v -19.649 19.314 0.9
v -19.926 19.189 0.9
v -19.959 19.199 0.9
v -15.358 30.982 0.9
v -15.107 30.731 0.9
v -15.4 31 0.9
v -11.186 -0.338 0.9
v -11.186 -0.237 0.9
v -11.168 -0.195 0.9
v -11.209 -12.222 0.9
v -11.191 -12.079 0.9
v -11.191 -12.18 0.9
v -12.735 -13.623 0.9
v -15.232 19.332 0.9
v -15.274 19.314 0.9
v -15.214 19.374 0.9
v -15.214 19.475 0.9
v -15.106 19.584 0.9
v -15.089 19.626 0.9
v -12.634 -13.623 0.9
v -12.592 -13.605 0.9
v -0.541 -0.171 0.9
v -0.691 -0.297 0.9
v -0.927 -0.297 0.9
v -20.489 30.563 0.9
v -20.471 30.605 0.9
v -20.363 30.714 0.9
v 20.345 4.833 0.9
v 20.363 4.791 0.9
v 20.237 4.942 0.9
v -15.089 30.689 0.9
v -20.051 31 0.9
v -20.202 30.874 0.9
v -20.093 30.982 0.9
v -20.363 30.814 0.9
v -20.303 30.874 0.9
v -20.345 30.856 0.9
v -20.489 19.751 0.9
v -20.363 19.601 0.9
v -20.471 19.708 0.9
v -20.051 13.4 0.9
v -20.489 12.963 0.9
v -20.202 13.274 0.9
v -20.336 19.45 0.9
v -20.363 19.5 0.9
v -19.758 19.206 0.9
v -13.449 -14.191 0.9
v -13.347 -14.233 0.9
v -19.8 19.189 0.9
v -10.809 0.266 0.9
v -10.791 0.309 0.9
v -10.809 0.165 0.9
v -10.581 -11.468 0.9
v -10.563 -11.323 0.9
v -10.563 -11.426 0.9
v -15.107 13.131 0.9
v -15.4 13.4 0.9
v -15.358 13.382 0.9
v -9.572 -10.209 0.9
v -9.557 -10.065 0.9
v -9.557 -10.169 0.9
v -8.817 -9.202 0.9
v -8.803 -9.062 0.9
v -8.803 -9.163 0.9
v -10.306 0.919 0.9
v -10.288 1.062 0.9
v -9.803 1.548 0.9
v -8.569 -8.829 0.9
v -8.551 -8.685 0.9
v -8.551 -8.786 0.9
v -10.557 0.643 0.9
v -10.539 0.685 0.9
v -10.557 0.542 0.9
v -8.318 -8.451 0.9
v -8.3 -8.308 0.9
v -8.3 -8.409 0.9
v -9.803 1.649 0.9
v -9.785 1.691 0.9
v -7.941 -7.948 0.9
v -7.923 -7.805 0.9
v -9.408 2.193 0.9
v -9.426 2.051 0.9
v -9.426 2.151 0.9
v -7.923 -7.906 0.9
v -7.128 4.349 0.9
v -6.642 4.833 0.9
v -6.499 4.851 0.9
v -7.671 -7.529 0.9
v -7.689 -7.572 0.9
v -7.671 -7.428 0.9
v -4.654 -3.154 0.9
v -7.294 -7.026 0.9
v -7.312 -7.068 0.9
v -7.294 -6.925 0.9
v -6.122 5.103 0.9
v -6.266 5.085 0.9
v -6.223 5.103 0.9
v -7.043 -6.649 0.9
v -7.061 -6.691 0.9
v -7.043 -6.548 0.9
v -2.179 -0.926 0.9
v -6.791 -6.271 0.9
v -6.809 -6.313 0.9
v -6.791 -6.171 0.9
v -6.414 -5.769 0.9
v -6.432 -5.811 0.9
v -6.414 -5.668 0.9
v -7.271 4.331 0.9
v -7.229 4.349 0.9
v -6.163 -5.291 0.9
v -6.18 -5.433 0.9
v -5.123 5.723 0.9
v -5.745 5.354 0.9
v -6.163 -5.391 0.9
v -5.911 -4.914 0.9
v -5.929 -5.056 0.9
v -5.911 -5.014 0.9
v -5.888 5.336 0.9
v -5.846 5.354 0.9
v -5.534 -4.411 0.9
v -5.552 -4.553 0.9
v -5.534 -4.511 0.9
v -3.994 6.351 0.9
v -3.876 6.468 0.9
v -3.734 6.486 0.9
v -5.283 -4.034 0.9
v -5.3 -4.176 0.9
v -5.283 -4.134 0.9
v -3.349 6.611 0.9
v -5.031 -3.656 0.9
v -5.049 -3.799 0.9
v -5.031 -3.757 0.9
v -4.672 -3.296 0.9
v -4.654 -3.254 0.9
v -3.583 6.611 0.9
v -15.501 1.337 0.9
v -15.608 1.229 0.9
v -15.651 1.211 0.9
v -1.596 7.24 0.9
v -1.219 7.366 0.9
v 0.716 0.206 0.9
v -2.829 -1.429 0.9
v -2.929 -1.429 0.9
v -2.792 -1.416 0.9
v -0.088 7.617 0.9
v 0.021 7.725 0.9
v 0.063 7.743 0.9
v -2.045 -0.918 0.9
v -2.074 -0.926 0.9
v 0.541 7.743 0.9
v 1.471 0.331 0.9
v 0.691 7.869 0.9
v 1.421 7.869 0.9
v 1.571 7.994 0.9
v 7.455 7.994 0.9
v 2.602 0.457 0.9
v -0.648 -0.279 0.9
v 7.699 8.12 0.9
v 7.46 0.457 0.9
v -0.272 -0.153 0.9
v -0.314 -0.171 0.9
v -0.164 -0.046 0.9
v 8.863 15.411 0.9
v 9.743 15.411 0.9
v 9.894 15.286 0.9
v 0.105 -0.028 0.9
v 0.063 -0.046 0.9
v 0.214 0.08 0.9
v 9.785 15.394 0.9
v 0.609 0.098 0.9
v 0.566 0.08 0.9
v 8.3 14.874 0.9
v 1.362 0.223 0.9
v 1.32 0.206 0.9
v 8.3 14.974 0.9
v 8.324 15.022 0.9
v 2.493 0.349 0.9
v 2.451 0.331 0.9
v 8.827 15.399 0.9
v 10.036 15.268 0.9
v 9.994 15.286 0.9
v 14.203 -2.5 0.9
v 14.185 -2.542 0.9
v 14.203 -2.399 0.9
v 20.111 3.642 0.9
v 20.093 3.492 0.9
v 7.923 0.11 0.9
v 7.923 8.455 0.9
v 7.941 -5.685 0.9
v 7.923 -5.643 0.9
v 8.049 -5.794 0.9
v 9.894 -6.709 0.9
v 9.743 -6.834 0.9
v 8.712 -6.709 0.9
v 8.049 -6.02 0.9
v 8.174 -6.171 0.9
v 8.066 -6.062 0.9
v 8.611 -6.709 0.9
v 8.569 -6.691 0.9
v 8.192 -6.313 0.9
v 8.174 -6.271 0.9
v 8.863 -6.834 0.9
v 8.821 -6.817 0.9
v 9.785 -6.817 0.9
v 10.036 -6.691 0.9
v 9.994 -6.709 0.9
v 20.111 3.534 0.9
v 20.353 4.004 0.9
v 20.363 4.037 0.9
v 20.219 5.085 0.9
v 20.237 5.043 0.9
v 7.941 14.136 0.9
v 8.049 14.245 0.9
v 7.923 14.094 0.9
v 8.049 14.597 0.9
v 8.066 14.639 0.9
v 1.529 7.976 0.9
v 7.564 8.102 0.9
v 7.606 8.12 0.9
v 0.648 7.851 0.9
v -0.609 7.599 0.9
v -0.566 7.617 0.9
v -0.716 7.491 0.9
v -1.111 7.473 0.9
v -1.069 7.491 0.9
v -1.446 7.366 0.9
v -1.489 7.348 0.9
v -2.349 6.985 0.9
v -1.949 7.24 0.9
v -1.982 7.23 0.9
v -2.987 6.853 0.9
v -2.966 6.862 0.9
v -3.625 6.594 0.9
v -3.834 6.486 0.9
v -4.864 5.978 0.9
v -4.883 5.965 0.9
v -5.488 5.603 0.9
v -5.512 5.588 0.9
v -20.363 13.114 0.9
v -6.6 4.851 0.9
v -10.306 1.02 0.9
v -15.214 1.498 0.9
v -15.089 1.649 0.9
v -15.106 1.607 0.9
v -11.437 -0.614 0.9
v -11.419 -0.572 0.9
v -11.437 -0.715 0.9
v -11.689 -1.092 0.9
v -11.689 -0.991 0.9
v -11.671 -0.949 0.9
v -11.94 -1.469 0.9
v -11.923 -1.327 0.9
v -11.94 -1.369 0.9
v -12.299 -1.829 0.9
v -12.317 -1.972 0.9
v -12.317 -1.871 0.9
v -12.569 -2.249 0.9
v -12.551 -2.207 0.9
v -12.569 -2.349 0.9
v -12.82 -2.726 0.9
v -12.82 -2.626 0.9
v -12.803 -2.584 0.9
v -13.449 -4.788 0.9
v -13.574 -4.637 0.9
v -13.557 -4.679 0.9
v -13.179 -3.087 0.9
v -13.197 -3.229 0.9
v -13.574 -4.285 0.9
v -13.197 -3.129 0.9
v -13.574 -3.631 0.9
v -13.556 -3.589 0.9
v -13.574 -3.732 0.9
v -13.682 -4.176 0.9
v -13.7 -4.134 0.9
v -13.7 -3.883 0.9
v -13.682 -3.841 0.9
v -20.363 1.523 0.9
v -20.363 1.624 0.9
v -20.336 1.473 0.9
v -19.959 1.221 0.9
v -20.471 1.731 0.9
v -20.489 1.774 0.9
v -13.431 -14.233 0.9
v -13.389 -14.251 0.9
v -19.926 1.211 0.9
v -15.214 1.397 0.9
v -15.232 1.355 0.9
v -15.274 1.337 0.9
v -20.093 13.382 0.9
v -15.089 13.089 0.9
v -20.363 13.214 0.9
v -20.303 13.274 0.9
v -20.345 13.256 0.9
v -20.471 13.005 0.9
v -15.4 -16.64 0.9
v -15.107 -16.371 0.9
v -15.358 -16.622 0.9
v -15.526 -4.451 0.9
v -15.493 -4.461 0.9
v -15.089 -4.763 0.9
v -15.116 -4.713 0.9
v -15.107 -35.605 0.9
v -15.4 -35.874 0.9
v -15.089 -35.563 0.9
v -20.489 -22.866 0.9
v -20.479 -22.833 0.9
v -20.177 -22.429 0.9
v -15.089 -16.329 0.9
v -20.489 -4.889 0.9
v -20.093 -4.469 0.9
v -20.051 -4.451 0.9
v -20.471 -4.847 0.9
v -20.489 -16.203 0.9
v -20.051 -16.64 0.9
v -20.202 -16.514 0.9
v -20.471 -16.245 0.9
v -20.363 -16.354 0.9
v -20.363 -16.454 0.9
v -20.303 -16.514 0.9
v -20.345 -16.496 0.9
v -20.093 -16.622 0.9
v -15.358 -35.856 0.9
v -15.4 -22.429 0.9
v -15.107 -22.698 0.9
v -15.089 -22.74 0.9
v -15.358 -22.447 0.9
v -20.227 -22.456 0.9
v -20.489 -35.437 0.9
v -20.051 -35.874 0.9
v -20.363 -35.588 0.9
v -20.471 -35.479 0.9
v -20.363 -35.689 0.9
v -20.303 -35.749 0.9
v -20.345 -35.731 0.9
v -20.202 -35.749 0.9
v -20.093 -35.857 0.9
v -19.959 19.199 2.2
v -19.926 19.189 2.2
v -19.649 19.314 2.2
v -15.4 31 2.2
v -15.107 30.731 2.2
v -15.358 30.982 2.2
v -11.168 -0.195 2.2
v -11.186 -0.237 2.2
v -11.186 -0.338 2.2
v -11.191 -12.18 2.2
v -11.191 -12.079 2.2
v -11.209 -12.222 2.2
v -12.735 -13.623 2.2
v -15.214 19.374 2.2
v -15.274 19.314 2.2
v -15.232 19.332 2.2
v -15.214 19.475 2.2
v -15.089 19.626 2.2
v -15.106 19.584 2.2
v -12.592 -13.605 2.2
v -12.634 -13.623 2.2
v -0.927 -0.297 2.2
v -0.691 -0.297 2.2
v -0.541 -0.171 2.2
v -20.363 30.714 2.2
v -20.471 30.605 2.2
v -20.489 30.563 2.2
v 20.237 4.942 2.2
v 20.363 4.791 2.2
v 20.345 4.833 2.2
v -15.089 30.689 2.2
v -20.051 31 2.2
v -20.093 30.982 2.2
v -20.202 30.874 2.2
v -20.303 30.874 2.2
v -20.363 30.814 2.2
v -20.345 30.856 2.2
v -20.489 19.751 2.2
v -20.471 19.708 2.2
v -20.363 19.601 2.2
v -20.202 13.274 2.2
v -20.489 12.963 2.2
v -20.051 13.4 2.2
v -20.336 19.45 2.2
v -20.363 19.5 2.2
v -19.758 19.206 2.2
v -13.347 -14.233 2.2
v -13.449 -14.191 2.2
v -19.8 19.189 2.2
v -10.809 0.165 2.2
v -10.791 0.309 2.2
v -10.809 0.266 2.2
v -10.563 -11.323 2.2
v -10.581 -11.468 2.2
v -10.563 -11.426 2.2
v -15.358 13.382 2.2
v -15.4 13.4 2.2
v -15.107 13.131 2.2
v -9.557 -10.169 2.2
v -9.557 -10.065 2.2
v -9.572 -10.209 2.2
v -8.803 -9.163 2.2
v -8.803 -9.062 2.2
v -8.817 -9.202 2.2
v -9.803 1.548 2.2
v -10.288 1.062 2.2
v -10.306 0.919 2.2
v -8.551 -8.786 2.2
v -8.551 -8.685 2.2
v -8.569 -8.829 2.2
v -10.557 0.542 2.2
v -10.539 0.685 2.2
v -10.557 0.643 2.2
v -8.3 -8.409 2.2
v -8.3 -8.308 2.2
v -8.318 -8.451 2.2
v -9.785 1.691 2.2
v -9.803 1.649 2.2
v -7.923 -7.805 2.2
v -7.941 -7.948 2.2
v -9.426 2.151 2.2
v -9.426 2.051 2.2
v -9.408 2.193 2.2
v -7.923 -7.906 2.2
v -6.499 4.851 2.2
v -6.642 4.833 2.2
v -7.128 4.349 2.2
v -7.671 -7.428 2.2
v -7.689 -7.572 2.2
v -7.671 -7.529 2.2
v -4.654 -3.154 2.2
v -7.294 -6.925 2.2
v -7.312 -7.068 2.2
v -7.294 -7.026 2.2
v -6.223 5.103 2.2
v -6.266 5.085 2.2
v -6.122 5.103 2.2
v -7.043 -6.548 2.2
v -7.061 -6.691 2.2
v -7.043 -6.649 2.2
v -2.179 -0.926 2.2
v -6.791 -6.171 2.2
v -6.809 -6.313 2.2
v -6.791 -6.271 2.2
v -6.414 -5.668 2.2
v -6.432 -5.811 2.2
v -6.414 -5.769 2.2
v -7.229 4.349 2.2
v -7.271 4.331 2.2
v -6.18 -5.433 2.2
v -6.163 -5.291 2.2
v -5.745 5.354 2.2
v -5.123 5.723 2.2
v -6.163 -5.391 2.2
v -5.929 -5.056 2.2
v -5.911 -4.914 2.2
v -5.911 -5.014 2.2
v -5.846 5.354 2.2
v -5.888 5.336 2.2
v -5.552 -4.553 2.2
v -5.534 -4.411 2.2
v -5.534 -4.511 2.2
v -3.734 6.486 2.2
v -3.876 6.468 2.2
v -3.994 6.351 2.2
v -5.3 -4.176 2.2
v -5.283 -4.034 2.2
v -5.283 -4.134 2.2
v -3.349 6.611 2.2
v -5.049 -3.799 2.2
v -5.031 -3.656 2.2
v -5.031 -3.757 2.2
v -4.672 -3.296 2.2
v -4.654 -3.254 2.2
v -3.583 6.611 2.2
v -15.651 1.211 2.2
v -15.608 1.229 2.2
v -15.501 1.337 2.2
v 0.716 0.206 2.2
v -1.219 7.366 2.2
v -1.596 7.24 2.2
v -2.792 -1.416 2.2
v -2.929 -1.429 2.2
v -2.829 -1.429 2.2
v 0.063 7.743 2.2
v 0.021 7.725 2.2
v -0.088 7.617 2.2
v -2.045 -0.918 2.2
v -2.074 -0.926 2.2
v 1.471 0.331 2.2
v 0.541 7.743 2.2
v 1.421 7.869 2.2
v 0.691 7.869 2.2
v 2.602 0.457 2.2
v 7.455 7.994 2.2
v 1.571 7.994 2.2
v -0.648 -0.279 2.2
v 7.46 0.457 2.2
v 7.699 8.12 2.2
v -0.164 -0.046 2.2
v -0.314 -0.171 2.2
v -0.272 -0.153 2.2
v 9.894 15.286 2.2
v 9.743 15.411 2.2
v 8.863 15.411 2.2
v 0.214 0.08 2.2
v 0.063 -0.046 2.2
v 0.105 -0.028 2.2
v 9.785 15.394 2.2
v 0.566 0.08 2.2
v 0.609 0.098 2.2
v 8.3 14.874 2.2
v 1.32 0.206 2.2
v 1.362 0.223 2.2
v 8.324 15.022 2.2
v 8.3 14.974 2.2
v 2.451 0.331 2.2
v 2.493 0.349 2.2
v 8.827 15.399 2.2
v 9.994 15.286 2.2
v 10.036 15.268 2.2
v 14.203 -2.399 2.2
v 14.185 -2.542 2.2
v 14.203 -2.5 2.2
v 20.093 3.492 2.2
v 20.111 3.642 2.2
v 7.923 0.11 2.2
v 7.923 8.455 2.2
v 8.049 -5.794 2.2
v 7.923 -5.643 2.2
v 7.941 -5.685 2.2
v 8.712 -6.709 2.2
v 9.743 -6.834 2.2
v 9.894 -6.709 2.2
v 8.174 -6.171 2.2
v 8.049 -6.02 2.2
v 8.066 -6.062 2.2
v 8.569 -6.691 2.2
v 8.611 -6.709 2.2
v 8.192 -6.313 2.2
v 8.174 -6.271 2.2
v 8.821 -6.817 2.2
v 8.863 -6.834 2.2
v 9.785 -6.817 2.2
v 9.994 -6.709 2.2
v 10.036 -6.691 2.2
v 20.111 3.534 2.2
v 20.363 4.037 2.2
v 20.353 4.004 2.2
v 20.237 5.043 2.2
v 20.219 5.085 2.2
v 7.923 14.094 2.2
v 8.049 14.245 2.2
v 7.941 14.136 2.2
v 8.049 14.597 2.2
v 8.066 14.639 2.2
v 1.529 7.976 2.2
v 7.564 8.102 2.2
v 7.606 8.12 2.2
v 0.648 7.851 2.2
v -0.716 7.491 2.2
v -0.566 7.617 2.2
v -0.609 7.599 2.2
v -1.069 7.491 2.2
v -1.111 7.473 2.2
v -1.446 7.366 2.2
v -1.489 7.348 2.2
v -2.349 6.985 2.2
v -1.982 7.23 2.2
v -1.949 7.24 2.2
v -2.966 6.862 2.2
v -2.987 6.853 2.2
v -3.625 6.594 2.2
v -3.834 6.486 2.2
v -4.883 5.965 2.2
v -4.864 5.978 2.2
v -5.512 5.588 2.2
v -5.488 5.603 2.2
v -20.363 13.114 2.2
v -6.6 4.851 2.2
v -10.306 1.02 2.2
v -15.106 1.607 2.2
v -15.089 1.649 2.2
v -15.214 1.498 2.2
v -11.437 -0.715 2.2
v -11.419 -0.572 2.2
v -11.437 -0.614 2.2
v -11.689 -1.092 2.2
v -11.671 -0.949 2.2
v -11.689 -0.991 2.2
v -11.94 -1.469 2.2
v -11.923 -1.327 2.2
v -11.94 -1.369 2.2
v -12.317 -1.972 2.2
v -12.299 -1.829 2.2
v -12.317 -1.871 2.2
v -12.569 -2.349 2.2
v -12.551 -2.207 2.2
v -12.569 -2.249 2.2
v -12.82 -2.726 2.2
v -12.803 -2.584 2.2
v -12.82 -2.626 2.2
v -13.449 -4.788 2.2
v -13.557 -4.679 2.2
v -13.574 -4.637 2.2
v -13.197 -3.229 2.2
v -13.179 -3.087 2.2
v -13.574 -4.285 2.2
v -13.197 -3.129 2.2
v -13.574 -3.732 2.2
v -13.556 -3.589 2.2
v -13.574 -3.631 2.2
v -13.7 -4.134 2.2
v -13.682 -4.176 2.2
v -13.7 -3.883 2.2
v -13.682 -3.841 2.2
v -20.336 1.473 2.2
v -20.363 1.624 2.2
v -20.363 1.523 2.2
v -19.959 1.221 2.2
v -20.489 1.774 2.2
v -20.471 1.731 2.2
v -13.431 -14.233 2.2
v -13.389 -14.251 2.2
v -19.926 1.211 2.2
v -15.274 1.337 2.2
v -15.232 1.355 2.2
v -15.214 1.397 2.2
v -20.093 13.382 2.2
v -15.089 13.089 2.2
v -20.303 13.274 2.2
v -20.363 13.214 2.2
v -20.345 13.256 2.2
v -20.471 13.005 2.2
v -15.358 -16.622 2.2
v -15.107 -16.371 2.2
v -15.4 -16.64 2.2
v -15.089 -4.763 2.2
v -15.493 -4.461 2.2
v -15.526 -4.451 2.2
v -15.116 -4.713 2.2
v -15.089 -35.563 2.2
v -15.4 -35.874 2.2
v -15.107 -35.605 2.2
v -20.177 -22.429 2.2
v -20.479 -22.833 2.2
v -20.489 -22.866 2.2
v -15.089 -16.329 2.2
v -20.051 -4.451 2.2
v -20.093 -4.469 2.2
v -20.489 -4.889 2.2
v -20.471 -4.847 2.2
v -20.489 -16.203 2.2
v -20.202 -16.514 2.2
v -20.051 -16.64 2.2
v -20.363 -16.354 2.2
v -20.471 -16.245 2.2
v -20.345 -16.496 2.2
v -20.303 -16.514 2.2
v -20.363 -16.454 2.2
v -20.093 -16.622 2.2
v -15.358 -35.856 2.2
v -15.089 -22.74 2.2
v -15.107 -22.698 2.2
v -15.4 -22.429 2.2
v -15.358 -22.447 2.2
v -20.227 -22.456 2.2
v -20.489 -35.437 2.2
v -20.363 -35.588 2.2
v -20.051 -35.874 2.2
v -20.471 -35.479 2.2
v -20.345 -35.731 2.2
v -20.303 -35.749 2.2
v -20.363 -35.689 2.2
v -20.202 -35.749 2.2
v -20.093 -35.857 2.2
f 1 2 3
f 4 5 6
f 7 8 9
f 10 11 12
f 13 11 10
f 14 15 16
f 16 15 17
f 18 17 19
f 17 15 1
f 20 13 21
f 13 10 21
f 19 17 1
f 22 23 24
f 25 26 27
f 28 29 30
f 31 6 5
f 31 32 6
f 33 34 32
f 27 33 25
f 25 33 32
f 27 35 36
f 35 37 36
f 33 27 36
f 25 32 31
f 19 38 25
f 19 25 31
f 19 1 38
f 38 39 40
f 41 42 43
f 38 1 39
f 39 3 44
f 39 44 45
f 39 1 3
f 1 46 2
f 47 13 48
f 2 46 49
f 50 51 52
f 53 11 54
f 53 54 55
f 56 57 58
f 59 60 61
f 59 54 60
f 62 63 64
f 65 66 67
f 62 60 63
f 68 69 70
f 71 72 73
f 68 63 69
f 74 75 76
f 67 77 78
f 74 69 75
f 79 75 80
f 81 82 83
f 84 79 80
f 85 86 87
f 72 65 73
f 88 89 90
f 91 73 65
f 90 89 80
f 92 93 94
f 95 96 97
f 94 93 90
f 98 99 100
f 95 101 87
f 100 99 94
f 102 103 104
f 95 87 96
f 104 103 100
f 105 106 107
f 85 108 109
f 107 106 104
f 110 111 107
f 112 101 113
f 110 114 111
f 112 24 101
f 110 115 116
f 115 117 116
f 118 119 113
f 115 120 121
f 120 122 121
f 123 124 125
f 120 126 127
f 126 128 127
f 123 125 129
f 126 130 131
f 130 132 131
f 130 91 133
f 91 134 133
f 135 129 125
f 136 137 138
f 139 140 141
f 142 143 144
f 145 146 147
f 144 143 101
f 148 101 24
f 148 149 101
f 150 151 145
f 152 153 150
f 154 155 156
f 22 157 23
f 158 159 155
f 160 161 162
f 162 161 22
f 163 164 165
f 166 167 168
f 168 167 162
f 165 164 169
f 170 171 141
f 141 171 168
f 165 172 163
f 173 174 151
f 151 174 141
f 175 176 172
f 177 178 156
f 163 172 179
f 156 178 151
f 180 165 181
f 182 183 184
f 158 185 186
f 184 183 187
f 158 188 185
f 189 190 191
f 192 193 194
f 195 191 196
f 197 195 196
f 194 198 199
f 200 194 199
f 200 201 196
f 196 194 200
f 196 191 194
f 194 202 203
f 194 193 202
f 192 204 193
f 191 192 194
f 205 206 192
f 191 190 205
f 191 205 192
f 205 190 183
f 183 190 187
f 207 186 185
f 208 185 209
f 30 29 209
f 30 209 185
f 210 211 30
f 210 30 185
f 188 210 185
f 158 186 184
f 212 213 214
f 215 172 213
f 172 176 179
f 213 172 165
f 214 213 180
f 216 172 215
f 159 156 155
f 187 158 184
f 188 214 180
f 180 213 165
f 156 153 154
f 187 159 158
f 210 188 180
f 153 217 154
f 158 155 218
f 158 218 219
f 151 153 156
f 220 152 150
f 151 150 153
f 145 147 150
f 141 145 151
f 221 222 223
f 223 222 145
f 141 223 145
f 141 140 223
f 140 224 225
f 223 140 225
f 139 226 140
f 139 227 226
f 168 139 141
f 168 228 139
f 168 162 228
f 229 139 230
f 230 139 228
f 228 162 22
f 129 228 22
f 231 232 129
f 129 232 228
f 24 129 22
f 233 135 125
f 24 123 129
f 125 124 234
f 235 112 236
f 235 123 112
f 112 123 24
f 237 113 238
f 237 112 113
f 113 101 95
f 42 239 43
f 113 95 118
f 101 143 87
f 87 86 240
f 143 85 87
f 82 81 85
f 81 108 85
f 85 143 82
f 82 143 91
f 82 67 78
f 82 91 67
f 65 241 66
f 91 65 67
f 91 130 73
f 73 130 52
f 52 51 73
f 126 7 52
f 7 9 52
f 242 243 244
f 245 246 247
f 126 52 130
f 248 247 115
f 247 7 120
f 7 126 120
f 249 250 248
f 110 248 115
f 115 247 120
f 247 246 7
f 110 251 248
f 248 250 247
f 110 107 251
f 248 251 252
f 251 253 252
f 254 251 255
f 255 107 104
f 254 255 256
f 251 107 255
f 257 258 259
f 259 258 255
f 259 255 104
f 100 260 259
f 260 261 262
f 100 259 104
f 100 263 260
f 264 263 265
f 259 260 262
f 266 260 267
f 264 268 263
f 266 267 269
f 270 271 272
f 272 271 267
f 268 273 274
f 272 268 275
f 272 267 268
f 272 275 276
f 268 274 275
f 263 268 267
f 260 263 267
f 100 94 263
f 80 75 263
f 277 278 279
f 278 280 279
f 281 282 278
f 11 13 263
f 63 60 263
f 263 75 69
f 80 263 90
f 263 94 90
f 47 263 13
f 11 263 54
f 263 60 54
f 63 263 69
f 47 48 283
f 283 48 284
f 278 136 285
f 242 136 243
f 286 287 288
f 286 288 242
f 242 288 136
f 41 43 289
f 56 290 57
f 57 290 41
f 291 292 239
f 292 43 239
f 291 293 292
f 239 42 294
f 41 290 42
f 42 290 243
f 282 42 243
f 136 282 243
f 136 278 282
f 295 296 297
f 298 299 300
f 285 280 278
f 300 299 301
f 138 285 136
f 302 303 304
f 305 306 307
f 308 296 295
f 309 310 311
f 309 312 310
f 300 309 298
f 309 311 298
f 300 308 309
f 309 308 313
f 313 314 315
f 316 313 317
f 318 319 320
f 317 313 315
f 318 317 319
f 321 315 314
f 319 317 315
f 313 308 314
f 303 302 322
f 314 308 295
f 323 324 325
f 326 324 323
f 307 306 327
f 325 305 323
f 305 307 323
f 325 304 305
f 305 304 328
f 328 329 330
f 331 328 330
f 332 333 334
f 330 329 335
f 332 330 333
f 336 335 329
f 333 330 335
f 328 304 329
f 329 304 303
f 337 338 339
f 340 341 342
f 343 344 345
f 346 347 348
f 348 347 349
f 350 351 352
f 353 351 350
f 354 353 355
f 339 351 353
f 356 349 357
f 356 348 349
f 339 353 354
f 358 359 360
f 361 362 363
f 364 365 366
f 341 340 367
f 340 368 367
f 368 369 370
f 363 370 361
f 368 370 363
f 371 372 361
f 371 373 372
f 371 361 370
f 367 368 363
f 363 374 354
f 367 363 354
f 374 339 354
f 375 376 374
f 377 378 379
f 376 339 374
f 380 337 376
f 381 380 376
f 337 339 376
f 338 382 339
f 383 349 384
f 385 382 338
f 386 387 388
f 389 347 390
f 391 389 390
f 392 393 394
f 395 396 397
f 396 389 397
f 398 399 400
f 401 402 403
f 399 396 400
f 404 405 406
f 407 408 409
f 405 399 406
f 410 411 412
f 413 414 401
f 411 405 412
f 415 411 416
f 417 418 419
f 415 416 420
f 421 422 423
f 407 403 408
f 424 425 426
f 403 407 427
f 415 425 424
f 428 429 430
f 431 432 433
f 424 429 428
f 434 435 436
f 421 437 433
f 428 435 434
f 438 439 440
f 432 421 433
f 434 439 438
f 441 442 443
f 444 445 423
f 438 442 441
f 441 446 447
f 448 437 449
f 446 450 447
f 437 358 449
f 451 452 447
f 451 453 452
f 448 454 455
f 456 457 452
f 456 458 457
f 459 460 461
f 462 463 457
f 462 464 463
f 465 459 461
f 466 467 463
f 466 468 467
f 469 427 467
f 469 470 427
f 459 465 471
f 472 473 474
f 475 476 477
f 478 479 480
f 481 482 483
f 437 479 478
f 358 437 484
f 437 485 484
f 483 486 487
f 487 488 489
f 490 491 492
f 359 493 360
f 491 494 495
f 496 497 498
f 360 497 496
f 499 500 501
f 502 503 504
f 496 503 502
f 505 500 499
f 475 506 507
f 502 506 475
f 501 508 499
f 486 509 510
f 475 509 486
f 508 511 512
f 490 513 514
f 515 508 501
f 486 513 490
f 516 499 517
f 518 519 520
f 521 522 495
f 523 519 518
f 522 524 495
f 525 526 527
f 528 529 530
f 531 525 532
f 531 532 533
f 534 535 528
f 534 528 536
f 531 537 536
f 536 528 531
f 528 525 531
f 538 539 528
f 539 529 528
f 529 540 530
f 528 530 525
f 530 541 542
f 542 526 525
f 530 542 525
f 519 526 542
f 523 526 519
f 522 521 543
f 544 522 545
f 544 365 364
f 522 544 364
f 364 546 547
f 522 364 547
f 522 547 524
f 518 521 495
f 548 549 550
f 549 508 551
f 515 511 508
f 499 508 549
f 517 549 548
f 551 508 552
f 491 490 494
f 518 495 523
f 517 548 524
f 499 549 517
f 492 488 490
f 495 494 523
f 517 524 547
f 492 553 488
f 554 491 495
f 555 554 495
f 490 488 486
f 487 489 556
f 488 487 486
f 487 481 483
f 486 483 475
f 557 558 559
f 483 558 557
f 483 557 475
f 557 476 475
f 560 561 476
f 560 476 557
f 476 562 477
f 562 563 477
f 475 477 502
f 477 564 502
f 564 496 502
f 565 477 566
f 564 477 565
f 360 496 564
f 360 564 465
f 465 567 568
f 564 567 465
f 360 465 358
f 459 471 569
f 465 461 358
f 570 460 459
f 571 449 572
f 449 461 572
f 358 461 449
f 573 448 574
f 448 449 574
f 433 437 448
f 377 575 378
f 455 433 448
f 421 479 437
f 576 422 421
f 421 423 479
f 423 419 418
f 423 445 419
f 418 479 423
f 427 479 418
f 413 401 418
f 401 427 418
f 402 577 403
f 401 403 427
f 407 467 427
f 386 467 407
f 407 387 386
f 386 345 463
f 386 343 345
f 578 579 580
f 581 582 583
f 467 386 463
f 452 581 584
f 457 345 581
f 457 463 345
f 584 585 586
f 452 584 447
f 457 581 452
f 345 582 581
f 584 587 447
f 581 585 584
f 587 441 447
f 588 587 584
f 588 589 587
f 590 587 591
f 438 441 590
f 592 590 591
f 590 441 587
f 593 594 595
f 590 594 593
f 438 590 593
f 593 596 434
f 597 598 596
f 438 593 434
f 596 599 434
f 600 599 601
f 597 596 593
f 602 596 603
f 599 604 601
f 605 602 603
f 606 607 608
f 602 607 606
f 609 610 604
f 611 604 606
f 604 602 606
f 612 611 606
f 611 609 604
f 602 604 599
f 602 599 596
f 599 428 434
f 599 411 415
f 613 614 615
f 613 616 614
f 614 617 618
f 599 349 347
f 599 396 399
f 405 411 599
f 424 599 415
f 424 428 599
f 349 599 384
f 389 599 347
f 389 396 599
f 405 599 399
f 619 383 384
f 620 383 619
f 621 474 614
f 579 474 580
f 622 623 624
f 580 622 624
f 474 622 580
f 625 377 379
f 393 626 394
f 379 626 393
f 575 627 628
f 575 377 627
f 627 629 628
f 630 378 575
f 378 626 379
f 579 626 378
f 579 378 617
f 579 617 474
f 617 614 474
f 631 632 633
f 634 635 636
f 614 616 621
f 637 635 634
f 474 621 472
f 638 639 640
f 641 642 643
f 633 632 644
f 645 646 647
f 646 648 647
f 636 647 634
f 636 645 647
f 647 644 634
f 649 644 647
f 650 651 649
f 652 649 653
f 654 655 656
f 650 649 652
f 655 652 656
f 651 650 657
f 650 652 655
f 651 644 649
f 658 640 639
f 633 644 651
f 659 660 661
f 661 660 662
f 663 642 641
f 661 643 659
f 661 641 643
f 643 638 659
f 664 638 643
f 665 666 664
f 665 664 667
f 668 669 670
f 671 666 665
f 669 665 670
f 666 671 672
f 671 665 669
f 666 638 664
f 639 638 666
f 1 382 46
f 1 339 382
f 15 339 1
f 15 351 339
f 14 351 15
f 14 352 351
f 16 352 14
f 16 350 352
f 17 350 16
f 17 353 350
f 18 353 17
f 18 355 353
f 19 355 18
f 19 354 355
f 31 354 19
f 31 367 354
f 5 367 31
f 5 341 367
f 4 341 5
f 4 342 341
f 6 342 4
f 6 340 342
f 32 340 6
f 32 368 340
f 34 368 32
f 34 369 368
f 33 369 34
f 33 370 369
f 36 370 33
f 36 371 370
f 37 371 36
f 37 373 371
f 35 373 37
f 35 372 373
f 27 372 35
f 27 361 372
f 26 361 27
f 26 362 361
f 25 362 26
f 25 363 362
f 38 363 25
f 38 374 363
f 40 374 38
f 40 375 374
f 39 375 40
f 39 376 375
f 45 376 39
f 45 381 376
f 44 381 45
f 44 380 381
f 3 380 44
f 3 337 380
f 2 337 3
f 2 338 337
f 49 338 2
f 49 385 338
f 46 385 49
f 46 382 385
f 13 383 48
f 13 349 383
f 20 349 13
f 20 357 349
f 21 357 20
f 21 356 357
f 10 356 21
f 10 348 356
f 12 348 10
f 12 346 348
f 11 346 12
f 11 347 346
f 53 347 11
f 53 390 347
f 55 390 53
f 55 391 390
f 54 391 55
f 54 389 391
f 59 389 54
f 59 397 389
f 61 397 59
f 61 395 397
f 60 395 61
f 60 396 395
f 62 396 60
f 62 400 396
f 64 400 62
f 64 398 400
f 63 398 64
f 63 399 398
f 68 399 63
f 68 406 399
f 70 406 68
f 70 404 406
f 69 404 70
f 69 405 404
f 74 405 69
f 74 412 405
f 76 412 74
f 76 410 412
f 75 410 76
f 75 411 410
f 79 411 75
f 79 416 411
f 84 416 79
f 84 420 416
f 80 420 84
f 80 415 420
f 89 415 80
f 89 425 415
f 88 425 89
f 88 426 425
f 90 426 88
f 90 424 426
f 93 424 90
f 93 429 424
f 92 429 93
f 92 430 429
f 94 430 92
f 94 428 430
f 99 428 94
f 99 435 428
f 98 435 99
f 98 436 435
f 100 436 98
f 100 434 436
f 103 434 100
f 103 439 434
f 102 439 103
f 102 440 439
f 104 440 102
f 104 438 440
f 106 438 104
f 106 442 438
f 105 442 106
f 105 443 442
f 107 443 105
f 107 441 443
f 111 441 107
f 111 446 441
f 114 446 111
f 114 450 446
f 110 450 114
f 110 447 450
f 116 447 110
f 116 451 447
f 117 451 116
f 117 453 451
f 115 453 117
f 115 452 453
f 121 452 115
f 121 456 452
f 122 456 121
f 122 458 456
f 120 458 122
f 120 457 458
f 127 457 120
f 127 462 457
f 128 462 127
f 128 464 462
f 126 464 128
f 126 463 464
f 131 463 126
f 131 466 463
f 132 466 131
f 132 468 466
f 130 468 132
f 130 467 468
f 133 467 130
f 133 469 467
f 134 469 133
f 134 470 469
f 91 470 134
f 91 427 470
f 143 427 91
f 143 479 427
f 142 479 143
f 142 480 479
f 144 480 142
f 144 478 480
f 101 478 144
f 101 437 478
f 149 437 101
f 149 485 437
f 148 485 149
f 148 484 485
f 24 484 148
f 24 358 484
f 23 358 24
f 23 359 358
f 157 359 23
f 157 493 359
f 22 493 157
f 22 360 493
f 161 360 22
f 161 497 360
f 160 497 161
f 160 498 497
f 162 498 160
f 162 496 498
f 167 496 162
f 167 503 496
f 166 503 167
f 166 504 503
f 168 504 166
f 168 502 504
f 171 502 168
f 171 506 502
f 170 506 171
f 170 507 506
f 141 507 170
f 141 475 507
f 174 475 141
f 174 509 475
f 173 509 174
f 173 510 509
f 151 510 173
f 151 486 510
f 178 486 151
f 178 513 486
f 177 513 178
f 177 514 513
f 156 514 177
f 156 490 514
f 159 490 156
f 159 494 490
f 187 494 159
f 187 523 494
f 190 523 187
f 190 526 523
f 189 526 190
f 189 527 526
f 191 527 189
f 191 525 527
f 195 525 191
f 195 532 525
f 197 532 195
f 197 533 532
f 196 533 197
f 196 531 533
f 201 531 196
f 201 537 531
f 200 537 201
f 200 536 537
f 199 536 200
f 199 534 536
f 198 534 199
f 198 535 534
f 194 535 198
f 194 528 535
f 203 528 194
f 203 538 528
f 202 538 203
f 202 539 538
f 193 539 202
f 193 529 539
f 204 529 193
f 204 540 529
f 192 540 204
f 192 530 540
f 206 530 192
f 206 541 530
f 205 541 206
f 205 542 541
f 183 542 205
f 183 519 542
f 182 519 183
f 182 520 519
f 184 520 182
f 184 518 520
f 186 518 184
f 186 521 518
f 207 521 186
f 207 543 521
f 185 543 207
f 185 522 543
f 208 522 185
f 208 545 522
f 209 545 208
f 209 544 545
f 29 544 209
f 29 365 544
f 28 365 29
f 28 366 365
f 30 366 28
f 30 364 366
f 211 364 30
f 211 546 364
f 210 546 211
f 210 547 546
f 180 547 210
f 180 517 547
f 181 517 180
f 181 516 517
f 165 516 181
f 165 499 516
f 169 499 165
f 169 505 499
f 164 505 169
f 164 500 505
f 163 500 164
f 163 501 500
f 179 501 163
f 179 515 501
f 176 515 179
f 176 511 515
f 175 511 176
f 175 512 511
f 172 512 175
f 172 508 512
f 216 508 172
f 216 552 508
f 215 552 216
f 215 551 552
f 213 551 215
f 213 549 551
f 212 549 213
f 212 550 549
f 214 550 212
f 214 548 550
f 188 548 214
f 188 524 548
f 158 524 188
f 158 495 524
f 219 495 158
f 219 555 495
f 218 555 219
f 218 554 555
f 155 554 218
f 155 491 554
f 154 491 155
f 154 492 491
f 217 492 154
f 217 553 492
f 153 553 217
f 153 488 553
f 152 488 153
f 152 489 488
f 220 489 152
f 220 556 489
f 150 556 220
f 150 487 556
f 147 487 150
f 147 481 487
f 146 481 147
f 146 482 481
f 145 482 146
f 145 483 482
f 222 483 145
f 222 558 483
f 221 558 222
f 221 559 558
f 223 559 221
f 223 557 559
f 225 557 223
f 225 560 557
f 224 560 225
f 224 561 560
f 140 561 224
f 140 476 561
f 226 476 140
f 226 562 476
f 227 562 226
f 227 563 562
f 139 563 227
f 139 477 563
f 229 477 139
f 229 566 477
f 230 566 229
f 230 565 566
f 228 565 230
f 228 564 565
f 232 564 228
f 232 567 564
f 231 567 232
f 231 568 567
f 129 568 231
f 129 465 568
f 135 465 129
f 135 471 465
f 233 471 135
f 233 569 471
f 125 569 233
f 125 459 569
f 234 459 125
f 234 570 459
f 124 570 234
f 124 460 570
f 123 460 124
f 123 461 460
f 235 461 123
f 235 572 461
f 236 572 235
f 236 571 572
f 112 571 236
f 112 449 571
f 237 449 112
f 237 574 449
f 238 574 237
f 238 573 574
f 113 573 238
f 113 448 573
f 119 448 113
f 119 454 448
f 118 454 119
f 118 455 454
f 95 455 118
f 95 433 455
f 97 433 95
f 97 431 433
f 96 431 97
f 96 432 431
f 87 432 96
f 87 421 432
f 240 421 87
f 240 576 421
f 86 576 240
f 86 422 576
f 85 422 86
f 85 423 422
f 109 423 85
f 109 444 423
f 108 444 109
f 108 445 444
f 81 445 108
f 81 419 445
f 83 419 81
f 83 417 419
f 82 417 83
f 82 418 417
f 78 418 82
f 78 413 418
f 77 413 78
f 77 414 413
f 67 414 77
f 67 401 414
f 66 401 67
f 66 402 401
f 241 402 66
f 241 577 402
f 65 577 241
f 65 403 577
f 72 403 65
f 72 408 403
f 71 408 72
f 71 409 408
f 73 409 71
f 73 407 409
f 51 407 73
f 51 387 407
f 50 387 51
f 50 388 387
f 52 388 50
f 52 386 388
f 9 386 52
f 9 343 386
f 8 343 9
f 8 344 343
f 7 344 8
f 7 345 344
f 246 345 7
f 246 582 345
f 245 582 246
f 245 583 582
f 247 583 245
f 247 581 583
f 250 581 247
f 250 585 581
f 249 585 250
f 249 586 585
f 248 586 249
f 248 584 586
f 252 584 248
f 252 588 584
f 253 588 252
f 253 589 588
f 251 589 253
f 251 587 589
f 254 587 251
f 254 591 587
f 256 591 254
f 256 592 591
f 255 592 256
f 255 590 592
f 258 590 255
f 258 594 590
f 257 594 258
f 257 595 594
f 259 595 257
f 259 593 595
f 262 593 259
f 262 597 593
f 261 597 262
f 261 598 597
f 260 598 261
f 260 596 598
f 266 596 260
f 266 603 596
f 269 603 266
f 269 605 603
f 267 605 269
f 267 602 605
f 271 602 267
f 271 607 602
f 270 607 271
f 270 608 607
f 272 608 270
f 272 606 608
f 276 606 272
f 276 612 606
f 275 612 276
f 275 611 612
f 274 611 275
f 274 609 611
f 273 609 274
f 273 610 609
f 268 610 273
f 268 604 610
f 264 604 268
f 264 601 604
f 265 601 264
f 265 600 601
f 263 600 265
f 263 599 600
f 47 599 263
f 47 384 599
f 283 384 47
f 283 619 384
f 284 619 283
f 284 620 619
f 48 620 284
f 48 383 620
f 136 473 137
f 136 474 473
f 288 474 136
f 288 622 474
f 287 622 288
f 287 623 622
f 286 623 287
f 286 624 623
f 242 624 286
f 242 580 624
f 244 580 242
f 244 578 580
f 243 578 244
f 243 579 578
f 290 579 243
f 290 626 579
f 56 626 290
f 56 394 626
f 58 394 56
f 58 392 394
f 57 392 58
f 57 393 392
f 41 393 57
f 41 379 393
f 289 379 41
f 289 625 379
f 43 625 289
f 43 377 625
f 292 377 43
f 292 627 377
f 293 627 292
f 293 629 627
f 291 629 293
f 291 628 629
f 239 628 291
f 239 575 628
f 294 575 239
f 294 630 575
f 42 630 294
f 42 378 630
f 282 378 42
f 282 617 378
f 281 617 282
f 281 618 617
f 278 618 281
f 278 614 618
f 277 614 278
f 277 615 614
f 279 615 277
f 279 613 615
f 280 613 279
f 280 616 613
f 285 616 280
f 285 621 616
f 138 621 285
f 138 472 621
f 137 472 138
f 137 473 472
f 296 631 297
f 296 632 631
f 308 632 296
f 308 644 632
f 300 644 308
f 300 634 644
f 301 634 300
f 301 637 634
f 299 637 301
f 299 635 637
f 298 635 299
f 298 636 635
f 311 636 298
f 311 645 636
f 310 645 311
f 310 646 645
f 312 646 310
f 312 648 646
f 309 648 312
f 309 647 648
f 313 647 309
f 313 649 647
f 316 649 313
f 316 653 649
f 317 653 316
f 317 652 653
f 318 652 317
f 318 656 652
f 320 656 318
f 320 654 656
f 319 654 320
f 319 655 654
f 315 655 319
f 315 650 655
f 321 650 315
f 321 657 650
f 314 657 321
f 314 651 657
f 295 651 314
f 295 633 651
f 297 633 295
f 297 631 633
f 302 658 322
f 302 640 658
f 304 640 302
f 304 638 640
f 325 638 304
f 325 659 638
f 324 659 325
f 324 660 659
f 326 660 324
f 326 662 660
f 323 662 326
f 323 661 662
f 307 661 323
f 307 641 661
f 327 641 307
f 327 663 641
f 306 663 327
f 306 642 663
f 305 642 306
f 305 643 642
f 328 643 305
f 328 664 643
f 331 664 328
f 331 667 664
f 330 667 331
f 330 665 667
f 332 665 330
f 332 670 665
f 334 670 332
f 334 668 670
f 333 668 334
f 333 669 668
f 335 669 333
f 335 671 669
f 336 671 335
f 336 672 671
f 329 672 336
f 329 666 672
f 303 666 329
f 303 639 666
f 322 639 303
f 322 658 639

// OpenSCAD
$fn = 24;
translate([0, -2.500, 0.900])
  linear_extrude(height=1.300) {
offset(r=0.06, $fn=8) {
    polygon(points=[[-20.177,-19.989],[-20.429,-20.366],[-20.429,-32.937],[-20.303,-33.063],[-20.303,-33.189],[-20.177,-33.189],[-20.051,-33.314],[-15.400,-33.314],[-15.149,-33.063],[-15.149,-20.240],[-15.400,-19.989]], paths=[[0,1,2,3,4,5,6,7,8,9,10]]);
    polygon(points=[[-20.051,-2.011],[-20.429,-2.389],[-20.429,-13.703],[-20.303,-13.829],[-20.303,-13.954],[-20.177,-13.954],[-20.051,-14.080],[-15.400,-14.080],[-15.149,-13.829],[-15.149,-2.263],[-15.526,-2.011]], paths=[[0,1,2,3,4,5,6,7,8,9,10]]);
    polygon(points=[[-20.051,15.840],[-20.177,15.714],[-20.303,15.714],[-20.303,15.589],[-20.429,15.463],[-20.429,4.274],[-20.303,4.149],[-20.303,4.023],[-19.926,3.771],[-15.651,3.771],[-15.526,3.897],[-15.274,3.897],[-15.274,4.023],[-15.149,4.149],[-15.149,15.589],[-15.400,15.840]], paths=[[0,1,2,3,4,5,6,7,8,9,10,11,12,13,14,15]]);
    polygon(points=[[20.177,7.543],[9.994,17.726],[9.869,17.726],[9.743,17.851],[8.863,17.851],[8.360,17.474],[8.360,17.349],[8.109,17.097],[8.109,16.720],[7.983,16.594],[7.983,10.937],[7.731,10.560],[7.606,10.560],[7.480,10.434],[1.571,10.434],[1.446,10.309],[0.691,10.309],[0.566,10.183],[0.063,10.183],[-0.063,10.057],[-0.566,10.057],[-0.691,9.931],[-1.069,9.931],[-1.194,9.806],[-1.446,9.806],[-1.571,9.680],[-1.949,9.680],[-2.326,9.429],[-2.954,9.303],[-3.331,9.051],[-3.583,9.051],[-3.709,8.926],[-3.834,8.926],[-3.960,8.800],[-4.840,8.423],[-5.091,8.171],[-5.469,8.046],[-5.720,7.794],[-5.846,7.794],[-6.097,7.543],[-6.223,7.543],[-6.474,7.291],[-6.600,7.291],[-7.103,6.789],[-7.229,6.789],[-9.366,4.651],[-9.366,4.526],[-9.743,4.149],[-9.743,4.023],[-10.246,3.520],[-10.246,3.394],[-10.497,3.143],[-10.497,3.017],[-10.749,2.766],[-10.749,2.640],[-11.126,2.263],[-11.126,2.137],[-11.377,1.886],[-11.377,1.760],[-11.629,1.509],[-11.629,1.383],[-11.880,1.131],[-11.880,1.006],[-12.257,0.629],[-12.257,0.503],[-12.509,0.251],[-12.509,0.126],[-12.760,-0.126],[-12.760,-0.251],[-13.137,-0.629],[-13.137,-0.754],[-13.514,-1.131],[-13.514,-1.257],[-13.640,-1.383],[-13.640,-1.634],[-13.514,-1.760],[-13.514,-2.137],[-13.389,-2.263],[-13.389,-11.691],[-12.760,-11.063],[-12.634,-11.063],[-11.251,-9.680],[-11.251,-9.554],[-10.623,-8.926],[-10.623,-8.800],[-9.617,-7.669],[-9.617,-7.543],[-8.863,-6.663],[-8.863,-6.537],[-8.611,-6.286],[-8.611,-6.160],[-8.360,-5.909],[-8.360,-5.783],[-7.983,-5.406],[-7.983,-5.280],[-7.731,-5.029],[-7.731,-4.903],[-7.354,-4.526],[-7.354,-4.400],[-7.103,-4.149],[-7.103,-4.023],[-6.851,-3.771],[-6.851,-3.646],[-6.474,-3.269],[-6.474,-3.143],[-6.223,-2.891],[-6.223,-2.766],[-5.971,-2.514],[-5.971,-2.389],[-5.594,-2.011],[-5.594,-1.886],[-5.343,-1.634],[-5.343,-1.509],[-5.091,-1.257],[-5.091,-1.131],[-4.714,-0.754],[-4.714,-0.629],[-2.954,1.131],[-2.829,1.131],[-2.200,1.634],[-2.074,1.634],[-0.943,2.263],[-0.691,2.263],[-0.566,2.389],[-0.314,2.389],[-0.189,2.514],[0.063,2.514],[0.189,2.640],[0.566,2.640],[0.691,2.766],[1.320,2.766],[1.446,2.891],[2.451,2.891],[2.577,3.017],[7.480,3.017],[7.983,2.640],[7.983,-3.143],[8.109,-3.269],[8.109,-3.520],[8.234,-3.646],[8.234,-3.771],[8.611,-4.149],[8.737,-4.149],[8.863,-4.274],[9.743,-4.274],[9.869,-4.149],[9.994,-4.149],[14.143,0.000],[14.143,0.126],[20.051,6.034],[20.051,6.160],[20.303,6.537],[20.303,7.291],[20.177,7.417]], paths=[[0,1,2,3,4,5,6,7,8,9,10,11,12,13,14,15,16,17,18,19,20,21,22,23,24,25,26,27,28,29,30,31,32,33,34,35,36,37,38,39,40,41,42,43,44,45,46,47,48,49,50,51,52,53,54,55,56,57,58,59,60,61,62,63,64,65,66,67,68,69,70,71,72,73,74,75,76,77,78,79,80,81,82,83,84,85,86,87,88,89,90,91,92,93,94,95,96,97,98,99,100,101,102,103,104,105,106,107,108,109,110,111,112,113,114,115,116,117,118,119,120,121,122,123,124,125,126,127,128,129,130,131,132,133,134,135,136,137,138,139,140,141,142,143,144,145,146,147,148,149,150,151,152,153]]);
    polygon(points=[[-20.051,33.440],[-20.177,33.314],[-20.303,33.314],[-20.303,33.189],[-20.429,33.063],[-20.429,22.251],[-20.303,22.126],[-20.303,22.000],[-19.926,21.749],[-19.800,21.749],[-19.674,21.874],[-15.274,21.874],[-15.274,22.000],[-15.149,22.126],[-15.149,33.189],[-15.400,33.440]], paths=[[0,1,2,3,4,5,6,7,8,9,10,11,12,13,14,15]]);
}
}
